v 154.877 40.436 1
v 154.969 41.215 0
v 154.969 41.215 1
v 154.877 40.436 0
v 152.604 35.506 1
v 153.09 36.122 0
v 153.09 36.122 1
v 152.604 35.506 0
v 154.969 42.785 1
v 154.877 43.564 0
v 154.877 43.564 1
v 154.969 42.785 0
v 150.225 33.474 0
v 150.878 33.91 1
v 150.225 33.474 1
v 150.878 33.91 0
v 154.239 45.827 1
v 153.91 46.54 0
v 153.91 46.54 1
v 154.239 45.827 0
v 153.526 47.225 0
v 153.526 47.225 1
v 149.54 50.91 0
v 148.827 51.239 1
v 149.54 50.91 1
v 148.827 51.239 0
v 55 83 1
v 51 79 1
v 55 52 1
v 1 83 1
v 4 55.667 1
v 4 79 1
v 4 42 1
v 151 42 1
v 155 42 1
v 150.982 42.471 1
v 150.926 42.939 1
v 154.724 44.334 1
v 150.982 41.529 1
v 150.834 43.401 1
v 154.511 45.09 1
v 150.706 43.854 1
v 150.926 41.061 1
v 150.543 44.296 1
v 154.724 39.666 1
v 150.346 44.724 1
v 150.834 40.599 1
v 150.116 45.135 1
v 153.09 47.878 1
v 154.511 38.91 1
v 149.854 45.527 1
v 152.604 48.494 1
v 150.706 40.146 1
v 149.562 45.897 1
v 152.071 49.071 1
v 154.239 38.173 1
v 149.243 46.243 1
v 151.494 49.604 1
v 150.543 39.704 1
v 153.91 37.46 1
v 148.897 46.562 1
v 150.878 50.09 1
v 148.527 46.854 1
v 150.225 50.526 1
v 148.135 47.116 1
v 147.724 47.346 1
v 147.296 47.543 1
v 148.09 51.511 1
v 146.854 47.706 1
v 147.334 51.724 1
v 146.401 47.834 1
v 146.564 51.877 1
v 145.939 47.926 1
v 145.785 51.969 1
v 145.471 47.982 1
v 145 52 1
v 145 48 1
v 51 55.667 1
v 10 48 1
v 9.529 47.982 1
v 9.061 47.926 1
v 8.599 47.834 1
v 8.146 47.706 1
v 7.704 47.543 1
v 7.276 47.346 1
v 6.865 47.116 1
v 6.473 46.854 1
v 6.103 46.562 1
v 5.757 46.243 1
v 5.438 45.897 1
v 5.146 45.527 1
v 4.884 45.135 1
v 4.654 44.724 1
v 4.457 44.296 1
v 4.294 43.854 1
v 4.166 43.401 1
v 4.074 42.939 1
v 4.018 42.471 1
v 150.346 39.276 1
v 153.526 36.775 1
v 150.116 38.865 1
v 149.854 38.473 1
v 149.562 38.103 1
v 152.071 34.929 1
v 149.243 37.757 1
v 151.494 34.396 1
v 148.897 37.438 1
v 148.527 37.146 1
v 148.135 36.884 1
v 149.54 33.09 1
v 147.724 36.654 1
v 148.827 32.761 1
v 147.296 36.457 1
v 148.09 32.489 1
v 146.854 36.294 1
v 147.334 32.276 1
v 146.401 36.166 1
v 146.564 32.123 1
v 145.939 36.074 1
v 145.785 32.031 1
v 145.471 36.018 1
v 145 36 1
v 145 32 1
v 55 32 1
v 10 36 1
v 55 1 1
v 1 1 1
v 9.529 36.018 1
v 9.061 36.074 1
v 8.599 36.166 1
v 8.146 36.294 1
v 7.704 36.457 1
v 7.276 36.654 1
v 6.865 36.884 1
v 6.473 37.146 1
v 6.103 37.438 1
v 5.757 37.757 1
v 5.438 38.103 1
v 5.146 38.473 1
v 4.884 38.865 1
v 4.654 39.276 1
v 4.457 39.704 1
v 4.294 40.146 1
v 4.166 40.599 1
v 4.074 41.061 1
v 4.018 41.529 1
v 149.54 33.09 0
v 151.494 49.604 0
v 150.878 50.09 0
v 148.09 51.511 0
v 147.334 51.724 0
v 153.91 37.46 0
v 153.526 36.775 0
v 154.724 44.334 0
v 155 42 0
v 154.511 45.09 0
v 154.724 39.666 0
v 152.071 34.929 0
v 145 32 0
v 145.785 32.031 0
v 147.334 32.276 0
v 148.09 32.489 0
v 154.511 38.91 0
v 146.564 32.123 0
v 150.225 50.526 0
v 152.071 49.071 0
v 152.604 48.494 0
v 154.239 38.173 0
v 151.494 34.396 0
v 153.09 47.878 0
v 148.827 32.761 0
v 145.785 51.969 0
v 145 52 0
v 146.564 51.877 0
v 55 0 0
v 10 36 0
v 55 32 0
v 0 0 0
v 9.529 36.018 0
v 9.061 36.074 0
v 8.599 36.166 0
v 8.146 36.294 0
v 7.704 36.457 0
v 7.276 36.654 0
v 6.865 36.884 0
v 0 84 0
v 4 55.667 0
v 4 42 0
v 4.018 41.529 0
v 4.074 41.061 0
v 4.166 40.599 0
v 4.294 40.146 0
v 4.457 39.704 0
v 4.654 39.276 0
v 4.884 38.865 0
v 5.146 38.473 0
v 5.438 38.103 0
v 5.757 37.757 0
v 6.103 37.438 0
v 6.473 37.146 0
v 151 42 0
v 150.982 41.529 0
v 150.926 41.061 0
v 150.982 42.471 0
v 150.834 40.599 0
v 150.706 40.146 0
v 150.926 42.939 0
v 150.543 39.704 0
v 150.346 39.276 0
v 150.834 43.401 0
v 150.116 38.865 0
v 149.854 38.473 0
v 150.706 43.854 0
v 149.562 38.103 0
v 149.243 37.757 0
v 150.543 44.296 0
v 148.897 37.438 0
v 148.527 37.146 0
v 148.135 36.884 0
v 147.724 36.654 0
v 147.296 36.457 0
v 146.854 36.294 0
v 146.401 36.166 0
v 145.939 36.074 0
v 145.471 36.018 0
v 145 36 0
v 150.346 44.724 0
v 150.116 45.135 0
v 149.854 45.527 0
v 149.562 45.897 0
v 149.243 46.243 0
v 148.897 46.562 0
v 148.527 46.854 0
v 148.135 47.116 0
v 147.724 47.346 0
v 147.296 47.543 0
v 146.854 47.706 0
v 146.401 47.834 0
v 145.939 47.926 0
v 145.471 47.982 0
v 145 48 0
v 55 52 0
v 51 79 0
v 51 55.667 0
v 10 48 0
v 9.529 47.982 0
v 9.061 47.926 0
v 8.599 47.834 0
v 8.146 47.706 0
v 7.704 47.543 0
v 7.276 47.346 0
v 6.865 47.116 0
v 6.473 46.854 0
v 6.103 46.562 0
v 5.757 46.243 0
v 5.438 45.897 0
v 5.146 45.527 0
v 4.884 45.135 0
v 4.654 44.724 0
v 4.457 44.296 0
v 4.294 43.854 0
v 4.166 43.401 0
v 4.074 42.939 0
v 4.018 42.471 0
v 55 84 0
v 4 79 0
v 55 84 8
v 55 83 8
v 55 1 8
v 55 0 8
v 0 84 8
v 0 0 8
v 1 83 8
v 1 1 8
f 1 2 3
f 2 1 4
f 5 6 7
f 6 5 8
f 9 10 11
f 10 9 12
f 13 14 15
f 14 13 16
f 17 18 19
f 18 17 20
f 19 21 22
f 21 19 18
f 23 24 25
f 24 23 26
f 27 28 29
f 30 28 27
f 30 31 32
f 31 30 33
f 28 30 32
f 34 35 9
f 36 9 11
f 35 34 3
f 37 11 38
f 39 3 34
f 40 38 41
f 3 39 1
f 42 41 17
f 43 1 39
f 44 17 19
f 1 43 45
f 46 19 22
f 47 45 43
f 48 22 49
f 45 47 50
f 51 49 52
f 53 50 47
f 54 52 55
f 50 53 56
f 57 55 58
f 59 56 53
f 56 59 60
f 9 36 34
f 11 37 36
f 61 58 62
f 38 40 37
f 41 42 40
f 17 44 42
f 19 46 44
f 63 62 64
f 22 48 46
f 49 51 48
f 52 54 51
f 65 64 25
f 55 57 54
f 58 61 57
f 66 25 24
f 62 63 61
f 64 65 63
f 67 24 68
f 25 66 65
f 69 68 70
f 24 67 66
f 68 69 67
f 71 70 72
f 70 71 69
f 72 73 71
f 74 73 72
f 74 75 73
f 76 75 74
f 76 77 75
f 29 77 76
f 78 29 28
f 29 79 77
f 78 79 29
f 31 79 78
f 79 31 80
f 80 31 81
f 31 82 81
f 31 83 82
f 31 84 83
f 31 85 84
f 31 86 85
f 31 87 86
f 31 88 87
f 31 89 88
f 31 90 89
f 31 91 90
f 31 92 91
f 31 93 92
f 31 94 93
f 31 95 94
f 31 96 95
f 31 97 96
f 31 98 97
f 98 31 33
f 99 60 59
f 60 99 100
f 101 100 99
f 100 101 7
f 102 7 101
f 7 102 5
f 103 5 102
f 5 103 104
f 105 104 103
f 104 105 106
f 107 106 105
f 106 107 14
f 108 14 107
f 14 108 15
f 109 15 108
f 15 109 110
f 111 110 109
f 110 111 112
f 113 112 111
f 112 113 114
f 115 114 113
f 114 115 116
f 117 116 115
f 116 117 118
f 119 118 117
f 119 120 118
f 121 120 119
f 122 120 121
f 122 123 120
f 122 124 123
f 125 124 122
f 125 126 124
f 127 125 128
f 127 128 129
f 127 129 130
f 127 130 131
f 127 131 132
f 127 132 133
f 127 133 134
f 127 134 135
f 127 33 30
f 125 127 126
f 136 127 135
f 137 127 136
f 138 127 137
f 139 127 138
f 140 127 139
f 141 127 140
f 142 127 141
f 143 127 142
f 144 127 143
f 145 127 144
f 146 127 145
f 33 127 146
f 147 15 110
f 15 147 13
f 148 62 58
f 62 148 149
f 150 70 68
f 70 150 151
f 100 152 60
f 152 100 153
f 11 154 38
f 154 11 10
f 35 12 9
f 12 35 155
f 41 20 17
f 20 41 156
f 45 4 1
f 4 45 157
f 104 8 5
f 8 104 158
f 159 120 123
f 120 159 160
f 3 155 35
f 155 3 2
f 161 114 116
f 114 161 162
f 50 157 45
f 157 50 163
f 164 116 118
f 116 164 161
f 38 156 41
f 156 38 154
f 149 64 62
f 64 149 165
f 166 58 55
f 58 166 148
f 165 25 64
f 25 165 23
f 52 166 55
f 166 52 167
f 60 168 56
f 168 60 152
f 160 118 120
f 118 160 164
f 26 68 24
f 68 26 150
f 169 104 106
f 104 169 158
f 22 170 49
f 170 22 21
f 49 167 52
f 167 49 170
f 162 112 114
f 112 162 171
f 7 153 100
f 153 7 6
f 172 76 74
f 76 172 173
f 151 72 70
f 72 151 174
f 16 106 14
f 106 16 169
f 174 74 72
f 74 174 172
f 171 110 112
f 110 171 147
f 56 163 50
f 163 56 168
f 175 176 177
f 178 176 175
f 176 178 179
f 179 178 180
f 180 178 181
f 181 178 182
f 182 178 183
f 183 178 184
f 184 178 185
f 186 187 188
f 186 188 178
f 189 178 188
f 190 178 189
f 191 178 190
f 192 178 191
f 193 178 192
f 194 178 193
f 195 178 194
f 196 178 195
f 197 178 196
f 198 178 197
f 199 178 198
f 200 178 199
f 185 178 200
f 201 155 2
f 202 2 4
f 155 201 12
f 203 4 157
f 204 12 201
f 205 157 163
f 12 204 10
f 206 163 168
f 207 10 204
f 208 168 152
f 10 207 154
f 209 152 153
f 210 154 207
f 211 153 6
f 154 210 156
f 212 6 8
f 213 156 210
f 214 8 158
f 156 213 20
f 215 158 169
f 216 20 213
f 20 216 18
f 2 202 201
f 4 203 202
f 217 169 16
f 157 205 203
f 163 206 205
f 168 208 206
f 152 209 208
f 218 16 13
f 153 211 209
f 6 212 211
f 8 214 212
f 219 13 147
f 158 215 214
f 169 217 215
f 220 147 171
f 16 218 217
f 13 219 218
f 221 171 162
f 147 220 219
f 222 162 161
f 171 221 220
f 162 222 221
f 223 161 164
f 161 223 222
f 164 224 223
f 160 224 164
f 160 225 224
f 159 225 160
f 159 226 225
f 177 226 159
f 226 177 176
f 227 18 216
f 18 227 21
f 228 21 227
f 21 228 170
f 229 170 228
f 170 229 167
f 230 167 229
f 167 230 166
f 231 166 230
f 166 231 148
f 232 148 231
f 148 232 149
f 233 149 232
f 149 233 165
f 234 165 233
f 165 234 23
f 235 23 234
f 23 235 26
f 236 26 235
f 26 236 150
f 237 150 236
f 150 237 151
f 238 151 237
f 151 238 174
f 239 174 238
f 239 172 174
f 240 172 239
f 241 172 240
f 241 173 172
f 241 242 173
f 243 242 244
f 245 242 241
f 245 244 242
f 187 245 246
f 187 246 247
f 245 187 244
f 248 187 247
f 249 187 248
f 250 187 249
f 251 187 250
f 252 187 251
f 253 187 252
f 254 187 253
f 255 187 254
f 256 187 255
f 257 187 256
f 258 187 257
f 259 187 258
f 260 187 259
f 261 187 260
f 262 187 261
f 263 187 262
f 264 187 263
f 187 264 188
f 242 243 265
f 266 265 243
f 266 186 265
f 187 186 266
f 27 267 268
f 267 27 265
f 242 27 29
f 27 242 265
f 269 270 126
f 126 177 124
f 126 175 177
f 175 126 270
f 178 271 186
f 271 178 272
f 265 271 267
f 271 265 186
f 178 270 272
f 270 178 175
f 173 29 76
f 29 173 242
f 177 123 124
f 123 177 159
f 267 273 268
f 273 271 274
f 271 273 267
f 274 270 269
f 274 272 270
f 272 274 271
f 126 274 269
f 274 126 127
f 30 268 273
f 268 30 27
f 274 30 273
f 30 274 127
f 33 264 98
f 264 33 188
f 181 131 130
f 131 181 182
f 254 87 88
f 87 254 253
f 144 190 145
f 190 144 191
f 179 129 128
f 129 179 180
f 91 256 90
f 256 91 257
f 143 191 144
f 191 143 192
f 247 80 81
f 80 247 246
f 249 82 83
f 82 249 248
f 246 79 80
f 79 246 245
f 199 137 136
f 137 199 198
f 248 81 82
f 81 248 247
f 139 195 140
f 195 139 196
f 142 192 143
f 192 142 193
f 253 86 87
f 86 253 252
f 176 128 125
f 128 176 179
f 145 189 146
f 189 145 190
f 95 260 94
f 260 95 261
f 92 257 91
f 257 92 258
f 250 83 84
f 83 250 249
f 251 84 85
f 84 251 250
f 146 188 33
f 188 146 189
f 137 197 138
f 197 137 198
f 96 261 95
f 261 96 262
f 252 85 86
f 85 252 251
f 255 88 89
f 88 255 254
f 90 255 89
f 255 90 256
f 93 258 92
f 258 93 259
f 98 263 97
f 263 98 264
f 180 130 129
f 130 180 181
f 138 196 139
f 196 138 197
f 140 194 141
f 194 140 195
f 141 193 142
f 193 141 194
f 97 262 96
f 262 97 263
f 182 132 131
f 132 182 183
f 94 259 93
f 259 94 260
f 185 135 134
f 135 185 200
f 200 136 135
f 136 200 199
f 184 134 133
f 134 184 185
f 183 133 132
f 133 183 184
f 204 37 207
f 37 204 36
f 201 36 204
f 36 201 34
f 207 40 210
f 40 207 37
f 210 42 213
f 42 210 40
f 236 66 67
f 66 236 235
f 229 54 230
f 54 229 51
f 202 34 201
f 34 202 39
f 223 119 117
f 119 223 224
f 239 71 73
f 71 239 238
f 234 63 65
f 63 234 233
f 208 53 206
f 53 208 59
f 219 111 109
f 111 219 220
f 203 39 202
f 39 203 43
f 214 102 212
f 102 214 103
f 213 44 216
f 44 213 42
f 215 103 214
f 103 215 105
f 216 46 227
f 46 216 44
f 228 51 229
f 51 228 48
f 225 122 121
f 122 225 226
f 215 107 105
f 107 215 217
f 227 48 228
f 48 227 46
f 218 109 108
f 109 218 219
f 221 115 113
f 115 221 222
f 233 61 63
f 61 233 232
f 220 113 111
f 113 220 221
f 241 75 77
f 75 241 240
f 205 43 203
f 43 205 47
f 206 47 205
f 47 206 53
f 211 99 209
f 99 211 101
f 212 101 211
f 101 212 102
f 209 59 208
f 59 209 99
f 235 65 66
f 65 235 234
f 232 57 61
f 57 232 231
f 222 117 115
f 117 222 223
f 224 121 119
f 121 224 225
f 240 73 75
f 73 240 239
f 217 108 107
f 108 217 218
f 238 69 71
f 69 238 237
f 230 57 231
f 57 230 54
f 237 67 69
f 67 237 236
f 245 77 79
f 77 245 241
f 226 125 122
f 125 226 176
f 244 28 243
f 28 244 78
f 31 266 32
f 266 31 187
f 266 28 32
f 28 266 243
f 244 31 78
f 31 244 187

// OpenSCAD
/*Customizer Variables*/
//phone width
width=82; //[10:150]
//phone height
heightFromBootm=155; //[50:250]
//height of bottom sides
holderHeight=55; //[10:100]

// fingers width channel
fingerSize=12; //[5:20]
// wall width
wall=1; //[0.2:0.2:2]
margine=4; //[0.5:0.5:10]
depth=8; //[2:20]

fingerHold=1; //[0:No,1:Yes]

onlyHalf=0; //[0:No,1:Yes]

/*[Hidden]*/
$fn=80;

difference()
{
render() base();
translate([margine+fingerSize/2,width/2-fingerSize/2+wall,-wall]) cube([heightFromBootm-2*margine-fingerSize,fingerSize,3*wall]);
if (fingerHold==0) translate([margine,margine+wall,-wall]) cube([holderHeight-2*margine,width/3-margine,3*wall]);    
translate([margine,width-width/3+wall,-wall]) cube([holderHeight-2*margine,width/3-margine,3*wall]);   

translate([margine+fingerSize/2,width/2+wall,-2*wall]) difference() { 
  cylinder(r=fingerSize/2, h=20); 
  translate([25,0,0]) cube(50, center=true); 
} 

translate([heightFromBootm-margine-fingerSize/2,width/2+wall,-2*wall]) difference() { 
  cylinder(r=fingerSize/2, h=20); 
  translate([-25,0,0]) cube(50, center=true); 
} 

if (onlyHalf==1)
translate([-5*wall,width/2+3*wall,-5*wall]) cube([heightFromBootm*1.5,width,depth*2]);

}



module base()
{
cube([holderHeight,width+2*wall,wall]);
translate([0,wall+width/2-margine-fingerSize/2,0]) cube([heightFromBootm-fingerSize/2-margine,fingerSize+2*margine,wall]);
cube([holderHeight,wall,depth]);    
translate([0,width+wall,0]) cube([holderHeight,wall,depth]);
cube([wall,2*wall+width,depth]);

if (onlyHalf==0)    
translate([heightFromBootm-margine-fingerSize/2,width/2+wall,0]) difference() { 
  cylinder(r=(fingerSize+2*margine)/2, h=wall); 
  translate([-25,0,0]) cube(50, center=true); 
} 

    
}
